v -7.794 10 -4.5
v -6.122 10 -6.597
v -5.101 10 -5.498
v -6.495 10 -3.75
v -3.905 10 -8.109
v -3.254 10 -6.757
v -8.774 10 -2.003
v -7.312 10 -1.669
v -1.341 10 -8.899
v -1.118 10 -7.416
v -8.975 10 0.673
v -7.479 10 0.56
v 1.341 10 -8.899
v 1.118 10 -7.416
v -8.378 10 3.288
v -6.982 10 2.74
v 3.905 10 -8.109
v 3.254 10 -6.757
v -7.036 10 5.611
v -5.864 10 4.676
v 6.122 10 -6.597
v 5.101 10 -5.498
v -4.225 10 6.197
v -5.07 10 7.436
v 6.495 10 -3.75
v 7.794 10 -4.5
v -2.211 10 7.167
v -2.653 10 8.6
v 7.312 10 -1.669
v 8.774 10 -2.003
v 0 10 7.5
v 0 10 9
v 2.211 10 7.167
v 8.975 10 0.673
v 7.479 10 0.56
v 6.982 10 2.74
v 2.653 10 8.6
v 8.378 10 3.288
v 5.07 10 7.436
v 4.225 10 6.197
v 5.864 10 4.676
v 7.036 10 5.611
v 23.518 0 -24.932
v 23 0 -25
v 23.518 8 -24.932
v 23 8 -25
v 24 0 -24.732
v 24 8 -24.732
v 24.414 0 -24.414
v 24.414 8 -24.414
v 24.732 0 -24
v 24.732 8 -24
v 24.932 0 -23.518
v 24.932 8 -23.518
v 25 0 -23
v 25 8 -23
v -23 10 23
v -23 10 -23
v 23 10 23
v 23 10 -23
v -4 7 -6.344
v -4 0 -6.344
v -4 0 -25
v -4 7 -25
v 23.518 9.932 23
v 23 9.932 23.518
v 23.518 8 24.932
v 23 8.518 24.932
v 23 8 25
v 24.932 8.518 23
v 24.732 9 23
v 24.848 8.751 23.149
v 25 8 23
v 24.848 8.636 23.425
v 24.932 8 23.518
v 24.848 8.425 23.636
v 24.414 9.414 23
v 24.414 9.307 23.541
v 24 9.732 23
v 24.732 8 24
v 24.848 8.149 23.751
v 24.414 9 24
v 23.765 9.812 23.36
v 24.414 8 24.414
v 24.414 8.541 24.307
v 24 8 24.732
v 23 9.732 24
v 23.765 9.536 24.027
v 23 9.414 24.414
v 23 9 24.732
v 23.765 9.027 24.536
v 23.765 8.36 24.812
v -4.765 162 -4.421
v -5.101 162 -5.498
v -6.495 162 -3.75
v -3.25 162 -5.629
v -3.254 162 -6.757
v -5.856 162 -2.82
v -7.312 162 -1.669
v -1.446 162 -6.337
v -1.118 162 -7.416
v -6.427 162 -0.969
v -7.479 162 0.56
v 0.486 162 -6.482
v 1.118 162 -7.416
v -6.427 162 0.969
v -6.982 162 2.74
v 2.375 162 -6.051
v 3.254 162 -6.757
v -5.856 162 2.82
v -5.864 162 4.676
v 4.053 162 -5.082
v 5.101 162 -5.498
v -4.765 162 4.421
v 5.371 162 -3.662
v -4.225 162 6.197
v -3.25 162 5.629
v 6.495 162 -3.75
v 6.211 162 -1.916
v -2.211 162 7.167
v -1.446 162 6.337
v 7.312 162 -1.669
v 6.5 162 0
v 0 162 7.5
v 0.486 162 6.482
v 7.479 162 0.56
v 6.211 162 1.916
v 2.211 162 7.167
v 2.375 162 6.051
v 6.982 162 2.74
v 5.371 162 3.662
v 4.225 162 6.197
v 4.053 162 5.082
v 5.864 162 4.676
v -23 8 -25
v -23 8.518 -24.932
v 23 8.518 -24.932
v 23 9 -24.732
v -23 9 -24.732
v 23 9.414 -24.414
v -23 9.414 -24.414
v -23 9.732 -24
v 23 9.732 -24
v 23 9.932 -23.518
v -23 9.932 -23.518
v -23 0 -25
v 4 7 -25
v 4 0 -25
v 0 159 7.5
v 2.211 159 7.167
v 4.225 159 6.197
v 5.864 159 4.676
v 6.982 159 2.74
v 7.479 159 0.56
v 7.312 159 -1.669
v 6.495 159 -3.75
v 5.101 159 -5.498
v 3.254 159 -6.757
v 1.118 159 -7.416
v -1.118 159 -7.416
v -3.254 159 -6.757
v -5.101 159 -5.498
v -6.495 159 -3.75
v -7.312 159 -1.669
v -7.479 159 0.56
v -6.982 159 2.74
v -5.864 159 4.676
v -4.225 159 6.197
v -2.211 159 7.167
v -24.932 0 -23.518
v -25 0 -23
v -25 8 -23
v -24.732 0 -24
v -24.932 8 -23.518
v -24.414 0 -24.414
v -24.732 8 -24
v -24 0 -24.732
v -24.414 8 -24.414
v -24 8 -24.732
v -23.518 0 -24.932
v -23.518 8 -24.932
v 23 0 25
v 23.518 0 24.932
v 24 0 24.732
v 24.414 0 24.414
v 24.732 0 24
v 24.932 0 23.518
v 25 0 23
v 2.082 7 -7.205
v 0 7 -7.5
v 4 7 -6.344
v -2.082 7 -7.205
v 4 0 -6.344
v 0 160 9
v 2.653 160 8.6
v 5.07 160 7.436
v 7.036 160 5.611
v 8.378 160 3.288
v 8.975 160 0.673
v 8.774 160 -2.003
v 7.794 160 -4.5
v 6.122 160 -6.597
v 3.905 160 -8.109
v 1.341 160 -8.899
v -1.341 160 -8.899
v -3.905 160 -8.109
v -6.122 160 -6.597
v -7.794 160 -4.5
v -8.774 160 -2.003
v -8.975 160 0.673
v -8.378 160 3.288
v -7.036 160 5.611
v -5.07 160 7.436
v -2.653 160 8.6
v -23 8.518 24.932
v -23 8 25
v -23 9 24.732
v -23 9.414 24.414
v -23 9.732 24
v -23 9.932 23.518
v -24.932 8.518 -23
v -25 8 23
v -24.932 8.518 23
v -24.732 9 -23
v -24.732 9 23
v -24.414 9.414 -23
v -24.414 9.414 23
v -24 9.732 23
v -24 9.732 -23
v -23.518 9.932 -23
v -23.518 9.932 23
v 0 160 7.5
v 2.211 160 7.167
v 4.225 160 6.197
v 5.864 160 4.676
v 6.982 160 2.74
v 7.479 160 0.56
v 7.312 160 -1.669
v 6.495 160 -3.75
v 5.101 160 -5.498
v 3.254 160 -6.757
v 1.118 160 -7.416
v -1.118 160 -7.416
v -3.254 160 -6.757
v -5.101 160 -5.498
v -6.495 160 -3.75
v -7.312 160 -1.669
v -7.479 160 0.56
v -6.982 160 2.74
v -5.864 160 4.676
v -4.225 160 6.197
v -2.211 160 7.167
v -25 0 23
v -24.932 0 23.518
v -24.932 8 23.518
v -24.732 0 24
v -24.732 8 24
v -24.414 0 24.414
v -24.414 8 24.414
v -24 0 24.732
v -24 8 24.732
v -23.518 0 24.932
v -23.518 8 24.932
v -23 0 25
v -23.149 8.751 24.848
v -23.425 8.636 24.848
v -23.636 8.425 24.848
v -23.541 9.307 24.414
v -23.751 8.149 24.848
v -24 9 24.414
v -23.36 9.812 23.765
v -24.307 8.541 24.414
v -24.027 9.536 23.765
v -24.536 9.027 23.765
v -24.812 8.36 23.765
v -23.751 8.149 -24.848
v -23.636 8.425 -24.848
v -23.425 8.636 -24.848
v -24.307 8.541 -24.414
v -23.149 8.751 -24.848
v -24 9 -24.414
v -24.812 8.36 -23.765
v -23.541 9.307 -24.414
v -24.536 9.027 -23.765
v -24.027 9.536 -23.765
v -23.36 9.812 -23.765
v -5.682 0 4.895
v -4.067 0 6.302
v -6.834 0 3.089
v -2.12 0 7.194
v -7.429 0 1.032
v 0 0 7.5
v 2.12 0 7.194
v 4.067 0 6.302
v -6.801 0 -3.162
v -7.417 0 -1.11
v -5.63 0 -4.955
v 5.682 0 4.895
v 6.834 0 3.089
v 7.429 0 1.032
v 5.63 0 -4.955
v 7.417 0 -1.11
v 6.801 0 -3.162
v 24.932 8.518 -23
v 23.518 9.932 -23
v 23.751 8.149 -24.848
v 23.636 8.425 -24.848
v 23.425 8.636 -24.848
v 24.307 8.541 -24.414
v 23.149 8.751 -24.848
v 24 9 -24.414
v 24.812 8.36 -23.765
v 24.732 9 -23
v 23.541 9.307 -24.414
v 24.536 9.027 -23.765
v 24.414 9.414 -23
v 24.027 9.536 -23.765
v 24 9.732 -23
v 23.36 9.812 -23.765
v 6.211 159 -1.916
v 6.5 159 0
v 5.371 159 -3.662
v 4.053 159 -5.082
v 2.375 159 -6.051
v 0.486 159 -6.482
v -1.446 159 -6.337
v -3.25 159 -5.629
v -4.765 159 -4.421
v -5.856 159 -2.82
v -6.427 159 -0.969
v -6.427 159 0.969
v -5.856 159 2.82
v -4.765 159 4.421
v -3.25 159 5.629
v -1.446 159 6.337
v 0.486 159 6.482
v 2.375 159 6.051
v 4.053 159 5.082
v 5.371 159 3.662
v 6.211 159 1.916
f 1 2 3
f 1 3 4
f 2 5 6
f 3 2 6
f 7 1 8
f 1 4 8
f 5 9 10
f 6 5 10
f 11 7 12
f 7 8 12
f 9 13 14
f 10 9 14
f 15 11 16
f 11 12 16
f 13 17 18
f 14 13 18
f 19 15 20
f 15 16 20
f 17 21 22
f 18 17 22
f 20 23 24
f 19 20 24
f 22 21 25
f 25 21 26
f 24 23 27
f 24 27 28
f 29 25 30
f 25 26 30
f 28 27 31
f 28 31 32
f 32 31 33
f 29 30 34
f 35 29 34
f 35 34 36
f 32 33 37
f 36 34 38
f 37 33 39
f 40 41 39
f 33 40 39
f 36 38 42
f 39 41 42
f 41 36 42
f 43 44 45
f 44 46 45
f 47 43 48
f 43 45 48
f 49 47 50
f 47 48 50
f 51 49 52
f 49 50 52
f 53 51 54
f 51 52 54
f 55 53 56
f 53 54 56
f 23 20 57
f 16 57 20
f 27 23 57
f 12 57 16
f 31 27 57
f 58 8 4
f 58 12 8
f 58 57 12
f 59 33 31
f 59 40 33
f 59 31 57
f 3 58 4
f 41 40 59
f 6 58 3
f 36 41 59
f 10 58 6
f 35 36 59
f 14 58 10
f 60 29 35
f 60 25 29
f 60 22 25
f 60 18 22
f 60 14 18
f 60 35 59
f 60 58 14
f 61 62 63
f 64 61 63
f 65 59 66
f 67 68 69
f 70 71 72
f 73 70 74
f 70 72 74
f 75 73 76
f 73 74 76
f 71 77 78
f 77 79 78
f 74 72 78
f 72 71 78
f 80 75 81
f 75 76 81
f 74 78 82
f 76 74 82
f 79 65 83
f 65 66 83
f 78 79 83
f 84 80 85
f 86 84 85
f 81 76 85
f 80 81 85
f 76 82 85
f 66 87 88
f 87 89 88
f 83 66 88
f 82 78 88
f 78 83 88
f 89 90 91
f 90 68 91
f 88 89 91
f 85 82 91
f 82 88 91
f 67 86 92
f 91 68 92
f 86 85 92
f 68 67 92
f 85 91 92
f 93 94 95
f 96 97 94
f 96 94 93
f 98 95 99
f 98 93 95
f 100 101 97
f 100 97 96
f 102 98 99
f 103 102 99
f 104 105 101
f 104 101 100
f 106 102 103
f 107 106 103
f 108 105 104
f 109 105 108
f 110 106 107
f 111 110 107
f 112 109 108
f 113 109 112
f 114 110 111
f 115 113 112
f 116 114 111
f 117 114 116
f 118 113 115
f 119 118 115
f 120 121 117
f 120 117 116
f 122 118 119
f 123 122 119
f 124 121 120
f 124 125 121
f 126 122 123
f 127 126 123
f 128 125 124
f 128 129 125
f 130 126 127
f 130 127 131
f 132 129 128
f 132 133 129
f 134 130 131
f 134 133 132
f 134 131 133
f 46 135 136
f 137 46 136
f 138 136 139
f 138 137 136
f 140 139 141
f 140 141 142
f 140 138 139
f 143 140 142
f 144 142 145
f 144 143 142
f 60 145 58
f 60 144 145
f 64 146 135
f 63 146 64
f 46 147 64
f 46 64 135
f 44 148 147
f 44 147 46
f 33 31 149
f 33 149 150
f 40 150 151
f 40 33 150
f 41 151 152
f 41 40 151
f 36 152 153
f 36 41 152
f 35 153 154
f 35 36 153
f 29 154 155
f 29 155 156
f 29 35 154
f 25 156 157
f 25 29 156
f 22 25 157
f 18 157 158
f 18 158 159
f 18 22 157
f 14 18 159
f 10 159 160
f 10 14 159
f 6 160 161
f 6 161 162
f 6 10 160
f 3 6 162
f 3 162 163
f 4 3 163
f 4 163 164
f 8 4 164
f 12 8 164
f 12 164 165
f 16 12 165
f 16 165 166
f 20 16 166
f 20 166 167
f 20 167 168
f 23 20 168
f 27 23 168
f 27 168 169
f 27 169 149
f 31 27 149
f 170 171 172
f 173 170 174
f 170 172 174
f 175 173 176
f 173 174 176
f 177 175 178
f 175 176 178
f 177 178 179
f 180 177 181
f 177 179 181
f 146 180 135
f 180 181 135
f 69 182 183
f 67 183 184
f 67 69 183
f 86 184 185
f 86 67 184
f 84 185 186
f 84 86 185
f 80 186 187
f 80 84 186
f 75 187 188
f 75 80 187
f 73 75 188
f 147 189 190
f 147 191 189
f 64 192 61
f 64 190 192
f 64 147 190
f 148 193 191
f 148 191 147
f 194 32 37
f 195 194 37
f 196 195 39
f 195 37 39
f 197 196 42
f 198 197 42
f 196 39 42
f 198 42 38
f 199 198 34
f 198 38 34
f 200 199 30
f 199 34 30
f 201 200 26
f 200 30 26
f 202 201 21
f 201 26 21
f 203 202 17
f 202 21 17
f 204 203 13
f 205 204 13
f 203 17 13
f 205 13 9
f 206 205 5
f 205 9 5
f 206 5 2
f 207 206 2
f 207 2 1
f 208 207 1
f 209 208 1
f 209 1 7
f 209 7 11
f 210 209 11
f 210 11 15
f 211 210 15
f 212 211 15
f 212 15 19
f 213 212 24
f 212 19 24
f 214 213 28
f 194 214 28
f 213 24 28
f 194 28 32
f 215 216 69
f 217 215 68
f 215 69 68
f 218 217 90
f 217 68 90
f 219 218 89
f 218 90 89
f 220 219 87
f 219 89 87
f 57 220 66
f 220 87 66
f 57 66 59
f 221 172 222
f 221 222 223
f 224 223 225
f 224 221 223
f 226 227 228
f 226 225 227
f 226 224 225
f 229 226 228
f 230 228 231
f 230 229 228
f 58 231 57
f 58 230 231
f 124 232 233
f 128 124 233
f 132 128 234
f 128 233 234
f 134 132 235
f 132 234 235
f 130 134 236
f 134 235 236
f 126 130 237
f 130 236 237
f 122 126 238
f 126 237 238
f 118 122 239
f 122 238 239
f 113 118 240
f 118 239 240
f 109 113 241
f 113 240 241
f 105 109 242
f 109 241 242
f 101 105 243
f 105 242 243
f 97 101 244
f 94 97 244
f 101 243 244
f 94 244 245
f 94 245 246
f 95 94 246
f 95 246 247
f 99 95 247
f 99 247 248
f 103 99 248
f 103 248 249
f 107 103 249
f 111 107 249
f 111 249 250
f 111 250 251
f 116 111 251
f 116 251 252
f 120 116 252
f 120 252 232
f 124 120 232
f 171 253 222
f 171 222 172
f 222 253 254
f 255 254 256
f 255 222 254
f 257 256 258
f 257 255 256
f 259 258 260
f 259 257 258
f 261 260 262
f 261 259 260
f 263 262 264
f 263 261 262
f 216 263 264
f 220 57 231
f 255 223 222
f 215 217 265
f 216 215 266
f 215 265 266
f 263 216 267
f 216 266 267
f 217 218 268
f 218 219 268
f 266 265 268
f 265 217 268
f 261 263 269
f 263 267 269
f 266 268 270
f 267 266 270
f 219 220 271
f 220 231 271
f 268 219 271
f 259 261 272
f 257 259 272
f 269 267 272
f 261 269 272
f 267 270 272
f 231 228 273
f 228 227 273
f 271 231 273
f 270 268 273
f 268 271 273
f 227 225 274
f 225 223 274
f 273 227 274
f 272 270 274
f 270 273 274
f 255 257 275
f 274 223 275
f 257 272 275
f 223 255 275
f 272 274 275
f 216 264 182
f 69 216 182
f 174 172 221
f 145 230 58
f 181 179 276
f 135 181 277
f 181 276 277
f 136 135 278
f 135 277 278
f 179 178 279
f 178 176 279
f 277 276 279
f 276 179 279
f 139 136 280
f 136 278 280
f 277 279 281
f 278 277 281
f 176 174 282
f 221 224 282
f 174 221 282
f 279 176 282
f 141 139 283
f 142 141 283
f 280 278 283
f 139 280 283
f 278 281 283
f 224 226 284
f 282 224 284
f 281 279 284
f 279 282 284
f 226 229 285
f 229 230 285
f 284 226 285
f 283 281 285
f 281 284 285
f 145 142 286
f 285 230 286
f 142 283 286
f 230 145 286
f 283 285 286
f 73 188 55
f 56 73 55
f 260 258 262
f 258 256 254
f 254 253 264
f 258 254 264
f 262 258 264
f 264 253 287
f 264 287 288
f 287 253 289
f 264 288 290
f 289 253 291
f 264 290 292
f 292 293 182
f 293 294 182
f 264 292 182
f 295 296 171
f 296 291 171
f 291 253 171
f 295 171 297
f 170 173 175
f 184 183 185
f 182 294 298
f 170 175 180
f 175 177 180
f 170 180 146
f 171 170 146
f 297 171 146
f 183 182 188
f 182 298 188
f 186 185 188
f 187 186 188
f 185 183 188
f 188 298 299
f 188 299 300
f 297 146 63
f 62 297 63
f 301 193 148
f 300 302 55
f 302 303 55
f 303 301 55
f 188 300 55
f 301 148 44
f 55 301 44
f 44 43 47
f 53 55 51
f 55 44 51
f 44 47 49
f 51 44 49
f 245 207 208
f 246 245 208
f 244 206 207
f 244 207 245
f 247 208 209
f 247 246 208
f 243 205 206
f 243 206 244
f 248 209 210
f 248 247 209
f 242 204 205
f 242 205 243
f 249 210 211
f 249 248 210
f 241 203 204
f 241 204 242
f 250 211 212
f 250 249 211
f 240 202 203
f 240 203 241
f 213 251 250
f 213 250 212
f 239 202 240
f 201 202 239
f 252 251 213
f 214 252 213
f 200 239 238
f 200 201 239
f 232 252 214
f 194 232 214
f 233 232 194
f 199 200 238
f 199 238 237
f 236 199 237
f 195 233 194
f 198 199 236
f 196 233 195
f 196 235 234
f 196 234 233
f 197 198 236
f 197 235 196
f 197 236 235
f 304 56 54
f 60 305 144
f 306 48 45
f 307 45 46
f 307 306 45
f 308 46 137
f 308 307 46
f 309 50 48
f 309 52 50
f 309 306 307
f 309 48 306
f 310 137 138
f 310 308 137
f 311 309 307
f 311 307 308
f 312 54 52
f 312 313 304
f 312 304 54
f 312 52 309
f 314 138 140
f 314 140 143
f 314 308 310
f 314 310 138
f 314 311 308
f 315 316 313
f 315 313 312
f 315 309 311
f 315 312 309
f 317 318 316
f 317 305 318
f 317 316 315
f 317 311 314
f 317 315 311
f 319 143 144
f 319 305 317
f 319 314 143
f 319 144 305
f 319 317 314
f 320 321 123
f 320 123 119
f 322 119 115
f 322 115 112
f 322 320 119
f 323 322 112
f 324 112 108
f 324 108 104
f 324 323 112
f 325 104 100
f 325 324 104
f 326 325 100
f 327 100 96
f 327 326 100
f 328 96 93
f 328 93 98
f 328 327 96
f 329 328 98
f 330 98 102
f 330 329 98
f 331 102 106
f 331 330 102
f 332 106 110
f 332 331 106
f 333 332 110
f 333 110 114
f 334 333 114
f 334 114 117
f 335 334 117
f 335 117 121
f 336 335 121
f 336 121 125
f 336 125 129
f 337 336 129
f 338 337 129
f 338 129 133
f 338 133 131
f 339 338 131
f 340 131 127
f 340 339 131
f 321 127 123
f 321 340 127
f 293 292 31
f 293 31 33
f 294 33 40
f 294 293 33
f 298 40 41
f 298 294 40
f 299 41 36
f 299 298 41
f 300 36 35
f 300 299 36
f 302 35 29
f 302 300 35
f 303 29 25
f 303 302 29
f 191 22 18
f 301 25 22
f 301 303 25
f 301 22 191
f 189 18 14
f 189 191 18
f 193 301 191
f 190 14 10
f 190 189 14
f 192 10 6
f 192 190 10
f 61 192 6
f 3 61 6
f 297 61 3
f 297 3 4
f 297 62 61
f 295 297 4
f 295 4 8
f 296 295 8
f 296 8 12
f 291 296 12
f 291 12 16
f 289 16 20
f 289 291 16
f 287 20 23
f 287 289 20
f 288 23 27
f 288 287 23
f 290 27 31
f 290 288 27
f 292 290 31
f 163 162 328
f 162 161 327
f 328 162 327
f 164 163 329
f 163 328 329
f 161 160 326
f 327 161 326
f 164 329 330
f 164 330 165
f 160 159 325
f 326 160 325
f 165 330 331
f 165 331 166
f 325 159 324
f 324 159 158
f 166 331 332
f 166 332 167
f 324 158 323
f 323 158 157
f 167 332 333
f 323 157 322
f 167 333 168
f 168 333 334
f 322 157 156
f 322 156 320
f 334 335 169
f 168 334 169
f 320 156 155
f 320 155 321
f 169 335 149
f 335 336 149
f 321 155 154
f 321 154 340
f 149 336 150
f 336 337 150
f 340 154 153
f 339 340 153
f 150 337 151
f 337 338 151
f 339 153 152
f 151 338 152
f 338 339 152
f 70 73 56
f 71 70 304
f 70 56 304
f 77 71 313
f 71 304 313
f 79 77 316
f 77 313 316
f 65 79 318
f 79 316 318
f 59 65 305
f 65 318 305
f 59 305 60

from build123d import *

# Parameters (mm, degrees)
SKETCH_220_W        = 50
SKETCH_220_H        = 50
SKETCH_220_R        = 7.5
EXTRUDE_1_DEPTH     = 10
FILLET_2_R          = 2
SKETCH_983_R        = 9
EXTRUDE_2_DEPTH     = 150
SHELL_6_T           = -1.5
SKETCH_6_R          = 7.5
EXTRUDE_5_DEPTH     = 3
SHELL_START         = 159
SHELL_13_OUTLINE_R  = 6.5
SHELL_13_DEPTH      = 3
SKETCH_9_W          = 8
SKETCH_9_H          = 19.844522728
CUT_EXTRUDE_1_DEPTH = 7


# Read off the part's stored shape, not the designer's step: 抽壳13
with BuildPart() as part:
    # Sketch 220 → 凸台-拉伸1 (new body)
    with BuildSketch(Plane(origin=(0, 0, 0), x_dir=(1, 0, 0), z_dir=(0, 1, 0))):
        Rectangle(SKETCH_220_W, SKETCH_220_H)
        with Locations(Location((0, 0, 0), (0, 0, 270))):
            Circle(SKETCH_220_R, mode=Mode.SUBTRACT)
    extrude(amount=EXTRUDE_1_DEPTH)

    # 圆角2
    fillet_2_edges = [part.edges().sort_by_distance(p)[0] for p in [
        (-25, 10, 0),
        (0, 10, 25),
        (25, 10, 0),
        (25, 5, 25),
        (-25, 5, 25),
        (-25, 5, -25),
        (25, 5, -25),
        (0, 10, -25),
    ]]
    fillet(fillet_2_edges, radius=FILLET_2_R)

    # 草图9 → 切除-拉伸1 (cut)
    with BuildSketch(Plane(origin=(0, 0, 0), x_dir=(-1, 0, 0), z_dir=(0, -1, 0))):
        with Locations((0, 15.077738636)):
            Rectangle(SKETCH_9_W, SKETCH_9_H)
    extrude(amount=-CUT_EXTRUDE_1_DEPTH, mode=Mode.SUBTRACT)


with BuildPart() as body_2:
    # Sketch 983 → 凸台-拉伸2 (new body)
    with BuildSketch(Plane(origin=(0, 10, 0), x_dir=(1, 0, 0), z_dir=(0, 1, 0))):
        with Locations(Location((0, 0, 0), (0, 0, 270))):
            Circle(SKETCH_983_R)
    extrude(amount=EXTRUDE_2_DEPTH)

    # 抽壳6
    shell_6_openings = [body_2.faces().sort_by_distance(p)[0] for p in [
        (0, 160, 0),
        (0, 10, 0),
    ]]
    offset(amount=SHELL_6_T, openings=shell_6_openings, kind=Kind.INTERSECTION)

    # 草图6 → 凸台-拉伸5 (add)
    with BuildSketch(Plane(origin=(0, 159, 0), x_dir=(1, 0, 0), z_dir=(0, 1, 0))):
        with Locations(Location((0, 0, 0), (0, 0, 270))):
            Circle(SKETCH_6_R)
    extrude(amount=EXTRUDE_5_DEPTH)

    # 抽壳13 outline → 抽壳13 (cut)
    with BuildSketch(Plane(origin=(0, 0, 0), x_dir=(1, 0, 0), z_dir=(0, 1, 0)).offset(SHELL_START)):
        Circle(SHELL_13_OUTLINE_R)
    extrude(amount=SHELL_13_DEPTH, mode=Mode.SUBTRACT)


solid = Compound([part.part, body_2.part])
